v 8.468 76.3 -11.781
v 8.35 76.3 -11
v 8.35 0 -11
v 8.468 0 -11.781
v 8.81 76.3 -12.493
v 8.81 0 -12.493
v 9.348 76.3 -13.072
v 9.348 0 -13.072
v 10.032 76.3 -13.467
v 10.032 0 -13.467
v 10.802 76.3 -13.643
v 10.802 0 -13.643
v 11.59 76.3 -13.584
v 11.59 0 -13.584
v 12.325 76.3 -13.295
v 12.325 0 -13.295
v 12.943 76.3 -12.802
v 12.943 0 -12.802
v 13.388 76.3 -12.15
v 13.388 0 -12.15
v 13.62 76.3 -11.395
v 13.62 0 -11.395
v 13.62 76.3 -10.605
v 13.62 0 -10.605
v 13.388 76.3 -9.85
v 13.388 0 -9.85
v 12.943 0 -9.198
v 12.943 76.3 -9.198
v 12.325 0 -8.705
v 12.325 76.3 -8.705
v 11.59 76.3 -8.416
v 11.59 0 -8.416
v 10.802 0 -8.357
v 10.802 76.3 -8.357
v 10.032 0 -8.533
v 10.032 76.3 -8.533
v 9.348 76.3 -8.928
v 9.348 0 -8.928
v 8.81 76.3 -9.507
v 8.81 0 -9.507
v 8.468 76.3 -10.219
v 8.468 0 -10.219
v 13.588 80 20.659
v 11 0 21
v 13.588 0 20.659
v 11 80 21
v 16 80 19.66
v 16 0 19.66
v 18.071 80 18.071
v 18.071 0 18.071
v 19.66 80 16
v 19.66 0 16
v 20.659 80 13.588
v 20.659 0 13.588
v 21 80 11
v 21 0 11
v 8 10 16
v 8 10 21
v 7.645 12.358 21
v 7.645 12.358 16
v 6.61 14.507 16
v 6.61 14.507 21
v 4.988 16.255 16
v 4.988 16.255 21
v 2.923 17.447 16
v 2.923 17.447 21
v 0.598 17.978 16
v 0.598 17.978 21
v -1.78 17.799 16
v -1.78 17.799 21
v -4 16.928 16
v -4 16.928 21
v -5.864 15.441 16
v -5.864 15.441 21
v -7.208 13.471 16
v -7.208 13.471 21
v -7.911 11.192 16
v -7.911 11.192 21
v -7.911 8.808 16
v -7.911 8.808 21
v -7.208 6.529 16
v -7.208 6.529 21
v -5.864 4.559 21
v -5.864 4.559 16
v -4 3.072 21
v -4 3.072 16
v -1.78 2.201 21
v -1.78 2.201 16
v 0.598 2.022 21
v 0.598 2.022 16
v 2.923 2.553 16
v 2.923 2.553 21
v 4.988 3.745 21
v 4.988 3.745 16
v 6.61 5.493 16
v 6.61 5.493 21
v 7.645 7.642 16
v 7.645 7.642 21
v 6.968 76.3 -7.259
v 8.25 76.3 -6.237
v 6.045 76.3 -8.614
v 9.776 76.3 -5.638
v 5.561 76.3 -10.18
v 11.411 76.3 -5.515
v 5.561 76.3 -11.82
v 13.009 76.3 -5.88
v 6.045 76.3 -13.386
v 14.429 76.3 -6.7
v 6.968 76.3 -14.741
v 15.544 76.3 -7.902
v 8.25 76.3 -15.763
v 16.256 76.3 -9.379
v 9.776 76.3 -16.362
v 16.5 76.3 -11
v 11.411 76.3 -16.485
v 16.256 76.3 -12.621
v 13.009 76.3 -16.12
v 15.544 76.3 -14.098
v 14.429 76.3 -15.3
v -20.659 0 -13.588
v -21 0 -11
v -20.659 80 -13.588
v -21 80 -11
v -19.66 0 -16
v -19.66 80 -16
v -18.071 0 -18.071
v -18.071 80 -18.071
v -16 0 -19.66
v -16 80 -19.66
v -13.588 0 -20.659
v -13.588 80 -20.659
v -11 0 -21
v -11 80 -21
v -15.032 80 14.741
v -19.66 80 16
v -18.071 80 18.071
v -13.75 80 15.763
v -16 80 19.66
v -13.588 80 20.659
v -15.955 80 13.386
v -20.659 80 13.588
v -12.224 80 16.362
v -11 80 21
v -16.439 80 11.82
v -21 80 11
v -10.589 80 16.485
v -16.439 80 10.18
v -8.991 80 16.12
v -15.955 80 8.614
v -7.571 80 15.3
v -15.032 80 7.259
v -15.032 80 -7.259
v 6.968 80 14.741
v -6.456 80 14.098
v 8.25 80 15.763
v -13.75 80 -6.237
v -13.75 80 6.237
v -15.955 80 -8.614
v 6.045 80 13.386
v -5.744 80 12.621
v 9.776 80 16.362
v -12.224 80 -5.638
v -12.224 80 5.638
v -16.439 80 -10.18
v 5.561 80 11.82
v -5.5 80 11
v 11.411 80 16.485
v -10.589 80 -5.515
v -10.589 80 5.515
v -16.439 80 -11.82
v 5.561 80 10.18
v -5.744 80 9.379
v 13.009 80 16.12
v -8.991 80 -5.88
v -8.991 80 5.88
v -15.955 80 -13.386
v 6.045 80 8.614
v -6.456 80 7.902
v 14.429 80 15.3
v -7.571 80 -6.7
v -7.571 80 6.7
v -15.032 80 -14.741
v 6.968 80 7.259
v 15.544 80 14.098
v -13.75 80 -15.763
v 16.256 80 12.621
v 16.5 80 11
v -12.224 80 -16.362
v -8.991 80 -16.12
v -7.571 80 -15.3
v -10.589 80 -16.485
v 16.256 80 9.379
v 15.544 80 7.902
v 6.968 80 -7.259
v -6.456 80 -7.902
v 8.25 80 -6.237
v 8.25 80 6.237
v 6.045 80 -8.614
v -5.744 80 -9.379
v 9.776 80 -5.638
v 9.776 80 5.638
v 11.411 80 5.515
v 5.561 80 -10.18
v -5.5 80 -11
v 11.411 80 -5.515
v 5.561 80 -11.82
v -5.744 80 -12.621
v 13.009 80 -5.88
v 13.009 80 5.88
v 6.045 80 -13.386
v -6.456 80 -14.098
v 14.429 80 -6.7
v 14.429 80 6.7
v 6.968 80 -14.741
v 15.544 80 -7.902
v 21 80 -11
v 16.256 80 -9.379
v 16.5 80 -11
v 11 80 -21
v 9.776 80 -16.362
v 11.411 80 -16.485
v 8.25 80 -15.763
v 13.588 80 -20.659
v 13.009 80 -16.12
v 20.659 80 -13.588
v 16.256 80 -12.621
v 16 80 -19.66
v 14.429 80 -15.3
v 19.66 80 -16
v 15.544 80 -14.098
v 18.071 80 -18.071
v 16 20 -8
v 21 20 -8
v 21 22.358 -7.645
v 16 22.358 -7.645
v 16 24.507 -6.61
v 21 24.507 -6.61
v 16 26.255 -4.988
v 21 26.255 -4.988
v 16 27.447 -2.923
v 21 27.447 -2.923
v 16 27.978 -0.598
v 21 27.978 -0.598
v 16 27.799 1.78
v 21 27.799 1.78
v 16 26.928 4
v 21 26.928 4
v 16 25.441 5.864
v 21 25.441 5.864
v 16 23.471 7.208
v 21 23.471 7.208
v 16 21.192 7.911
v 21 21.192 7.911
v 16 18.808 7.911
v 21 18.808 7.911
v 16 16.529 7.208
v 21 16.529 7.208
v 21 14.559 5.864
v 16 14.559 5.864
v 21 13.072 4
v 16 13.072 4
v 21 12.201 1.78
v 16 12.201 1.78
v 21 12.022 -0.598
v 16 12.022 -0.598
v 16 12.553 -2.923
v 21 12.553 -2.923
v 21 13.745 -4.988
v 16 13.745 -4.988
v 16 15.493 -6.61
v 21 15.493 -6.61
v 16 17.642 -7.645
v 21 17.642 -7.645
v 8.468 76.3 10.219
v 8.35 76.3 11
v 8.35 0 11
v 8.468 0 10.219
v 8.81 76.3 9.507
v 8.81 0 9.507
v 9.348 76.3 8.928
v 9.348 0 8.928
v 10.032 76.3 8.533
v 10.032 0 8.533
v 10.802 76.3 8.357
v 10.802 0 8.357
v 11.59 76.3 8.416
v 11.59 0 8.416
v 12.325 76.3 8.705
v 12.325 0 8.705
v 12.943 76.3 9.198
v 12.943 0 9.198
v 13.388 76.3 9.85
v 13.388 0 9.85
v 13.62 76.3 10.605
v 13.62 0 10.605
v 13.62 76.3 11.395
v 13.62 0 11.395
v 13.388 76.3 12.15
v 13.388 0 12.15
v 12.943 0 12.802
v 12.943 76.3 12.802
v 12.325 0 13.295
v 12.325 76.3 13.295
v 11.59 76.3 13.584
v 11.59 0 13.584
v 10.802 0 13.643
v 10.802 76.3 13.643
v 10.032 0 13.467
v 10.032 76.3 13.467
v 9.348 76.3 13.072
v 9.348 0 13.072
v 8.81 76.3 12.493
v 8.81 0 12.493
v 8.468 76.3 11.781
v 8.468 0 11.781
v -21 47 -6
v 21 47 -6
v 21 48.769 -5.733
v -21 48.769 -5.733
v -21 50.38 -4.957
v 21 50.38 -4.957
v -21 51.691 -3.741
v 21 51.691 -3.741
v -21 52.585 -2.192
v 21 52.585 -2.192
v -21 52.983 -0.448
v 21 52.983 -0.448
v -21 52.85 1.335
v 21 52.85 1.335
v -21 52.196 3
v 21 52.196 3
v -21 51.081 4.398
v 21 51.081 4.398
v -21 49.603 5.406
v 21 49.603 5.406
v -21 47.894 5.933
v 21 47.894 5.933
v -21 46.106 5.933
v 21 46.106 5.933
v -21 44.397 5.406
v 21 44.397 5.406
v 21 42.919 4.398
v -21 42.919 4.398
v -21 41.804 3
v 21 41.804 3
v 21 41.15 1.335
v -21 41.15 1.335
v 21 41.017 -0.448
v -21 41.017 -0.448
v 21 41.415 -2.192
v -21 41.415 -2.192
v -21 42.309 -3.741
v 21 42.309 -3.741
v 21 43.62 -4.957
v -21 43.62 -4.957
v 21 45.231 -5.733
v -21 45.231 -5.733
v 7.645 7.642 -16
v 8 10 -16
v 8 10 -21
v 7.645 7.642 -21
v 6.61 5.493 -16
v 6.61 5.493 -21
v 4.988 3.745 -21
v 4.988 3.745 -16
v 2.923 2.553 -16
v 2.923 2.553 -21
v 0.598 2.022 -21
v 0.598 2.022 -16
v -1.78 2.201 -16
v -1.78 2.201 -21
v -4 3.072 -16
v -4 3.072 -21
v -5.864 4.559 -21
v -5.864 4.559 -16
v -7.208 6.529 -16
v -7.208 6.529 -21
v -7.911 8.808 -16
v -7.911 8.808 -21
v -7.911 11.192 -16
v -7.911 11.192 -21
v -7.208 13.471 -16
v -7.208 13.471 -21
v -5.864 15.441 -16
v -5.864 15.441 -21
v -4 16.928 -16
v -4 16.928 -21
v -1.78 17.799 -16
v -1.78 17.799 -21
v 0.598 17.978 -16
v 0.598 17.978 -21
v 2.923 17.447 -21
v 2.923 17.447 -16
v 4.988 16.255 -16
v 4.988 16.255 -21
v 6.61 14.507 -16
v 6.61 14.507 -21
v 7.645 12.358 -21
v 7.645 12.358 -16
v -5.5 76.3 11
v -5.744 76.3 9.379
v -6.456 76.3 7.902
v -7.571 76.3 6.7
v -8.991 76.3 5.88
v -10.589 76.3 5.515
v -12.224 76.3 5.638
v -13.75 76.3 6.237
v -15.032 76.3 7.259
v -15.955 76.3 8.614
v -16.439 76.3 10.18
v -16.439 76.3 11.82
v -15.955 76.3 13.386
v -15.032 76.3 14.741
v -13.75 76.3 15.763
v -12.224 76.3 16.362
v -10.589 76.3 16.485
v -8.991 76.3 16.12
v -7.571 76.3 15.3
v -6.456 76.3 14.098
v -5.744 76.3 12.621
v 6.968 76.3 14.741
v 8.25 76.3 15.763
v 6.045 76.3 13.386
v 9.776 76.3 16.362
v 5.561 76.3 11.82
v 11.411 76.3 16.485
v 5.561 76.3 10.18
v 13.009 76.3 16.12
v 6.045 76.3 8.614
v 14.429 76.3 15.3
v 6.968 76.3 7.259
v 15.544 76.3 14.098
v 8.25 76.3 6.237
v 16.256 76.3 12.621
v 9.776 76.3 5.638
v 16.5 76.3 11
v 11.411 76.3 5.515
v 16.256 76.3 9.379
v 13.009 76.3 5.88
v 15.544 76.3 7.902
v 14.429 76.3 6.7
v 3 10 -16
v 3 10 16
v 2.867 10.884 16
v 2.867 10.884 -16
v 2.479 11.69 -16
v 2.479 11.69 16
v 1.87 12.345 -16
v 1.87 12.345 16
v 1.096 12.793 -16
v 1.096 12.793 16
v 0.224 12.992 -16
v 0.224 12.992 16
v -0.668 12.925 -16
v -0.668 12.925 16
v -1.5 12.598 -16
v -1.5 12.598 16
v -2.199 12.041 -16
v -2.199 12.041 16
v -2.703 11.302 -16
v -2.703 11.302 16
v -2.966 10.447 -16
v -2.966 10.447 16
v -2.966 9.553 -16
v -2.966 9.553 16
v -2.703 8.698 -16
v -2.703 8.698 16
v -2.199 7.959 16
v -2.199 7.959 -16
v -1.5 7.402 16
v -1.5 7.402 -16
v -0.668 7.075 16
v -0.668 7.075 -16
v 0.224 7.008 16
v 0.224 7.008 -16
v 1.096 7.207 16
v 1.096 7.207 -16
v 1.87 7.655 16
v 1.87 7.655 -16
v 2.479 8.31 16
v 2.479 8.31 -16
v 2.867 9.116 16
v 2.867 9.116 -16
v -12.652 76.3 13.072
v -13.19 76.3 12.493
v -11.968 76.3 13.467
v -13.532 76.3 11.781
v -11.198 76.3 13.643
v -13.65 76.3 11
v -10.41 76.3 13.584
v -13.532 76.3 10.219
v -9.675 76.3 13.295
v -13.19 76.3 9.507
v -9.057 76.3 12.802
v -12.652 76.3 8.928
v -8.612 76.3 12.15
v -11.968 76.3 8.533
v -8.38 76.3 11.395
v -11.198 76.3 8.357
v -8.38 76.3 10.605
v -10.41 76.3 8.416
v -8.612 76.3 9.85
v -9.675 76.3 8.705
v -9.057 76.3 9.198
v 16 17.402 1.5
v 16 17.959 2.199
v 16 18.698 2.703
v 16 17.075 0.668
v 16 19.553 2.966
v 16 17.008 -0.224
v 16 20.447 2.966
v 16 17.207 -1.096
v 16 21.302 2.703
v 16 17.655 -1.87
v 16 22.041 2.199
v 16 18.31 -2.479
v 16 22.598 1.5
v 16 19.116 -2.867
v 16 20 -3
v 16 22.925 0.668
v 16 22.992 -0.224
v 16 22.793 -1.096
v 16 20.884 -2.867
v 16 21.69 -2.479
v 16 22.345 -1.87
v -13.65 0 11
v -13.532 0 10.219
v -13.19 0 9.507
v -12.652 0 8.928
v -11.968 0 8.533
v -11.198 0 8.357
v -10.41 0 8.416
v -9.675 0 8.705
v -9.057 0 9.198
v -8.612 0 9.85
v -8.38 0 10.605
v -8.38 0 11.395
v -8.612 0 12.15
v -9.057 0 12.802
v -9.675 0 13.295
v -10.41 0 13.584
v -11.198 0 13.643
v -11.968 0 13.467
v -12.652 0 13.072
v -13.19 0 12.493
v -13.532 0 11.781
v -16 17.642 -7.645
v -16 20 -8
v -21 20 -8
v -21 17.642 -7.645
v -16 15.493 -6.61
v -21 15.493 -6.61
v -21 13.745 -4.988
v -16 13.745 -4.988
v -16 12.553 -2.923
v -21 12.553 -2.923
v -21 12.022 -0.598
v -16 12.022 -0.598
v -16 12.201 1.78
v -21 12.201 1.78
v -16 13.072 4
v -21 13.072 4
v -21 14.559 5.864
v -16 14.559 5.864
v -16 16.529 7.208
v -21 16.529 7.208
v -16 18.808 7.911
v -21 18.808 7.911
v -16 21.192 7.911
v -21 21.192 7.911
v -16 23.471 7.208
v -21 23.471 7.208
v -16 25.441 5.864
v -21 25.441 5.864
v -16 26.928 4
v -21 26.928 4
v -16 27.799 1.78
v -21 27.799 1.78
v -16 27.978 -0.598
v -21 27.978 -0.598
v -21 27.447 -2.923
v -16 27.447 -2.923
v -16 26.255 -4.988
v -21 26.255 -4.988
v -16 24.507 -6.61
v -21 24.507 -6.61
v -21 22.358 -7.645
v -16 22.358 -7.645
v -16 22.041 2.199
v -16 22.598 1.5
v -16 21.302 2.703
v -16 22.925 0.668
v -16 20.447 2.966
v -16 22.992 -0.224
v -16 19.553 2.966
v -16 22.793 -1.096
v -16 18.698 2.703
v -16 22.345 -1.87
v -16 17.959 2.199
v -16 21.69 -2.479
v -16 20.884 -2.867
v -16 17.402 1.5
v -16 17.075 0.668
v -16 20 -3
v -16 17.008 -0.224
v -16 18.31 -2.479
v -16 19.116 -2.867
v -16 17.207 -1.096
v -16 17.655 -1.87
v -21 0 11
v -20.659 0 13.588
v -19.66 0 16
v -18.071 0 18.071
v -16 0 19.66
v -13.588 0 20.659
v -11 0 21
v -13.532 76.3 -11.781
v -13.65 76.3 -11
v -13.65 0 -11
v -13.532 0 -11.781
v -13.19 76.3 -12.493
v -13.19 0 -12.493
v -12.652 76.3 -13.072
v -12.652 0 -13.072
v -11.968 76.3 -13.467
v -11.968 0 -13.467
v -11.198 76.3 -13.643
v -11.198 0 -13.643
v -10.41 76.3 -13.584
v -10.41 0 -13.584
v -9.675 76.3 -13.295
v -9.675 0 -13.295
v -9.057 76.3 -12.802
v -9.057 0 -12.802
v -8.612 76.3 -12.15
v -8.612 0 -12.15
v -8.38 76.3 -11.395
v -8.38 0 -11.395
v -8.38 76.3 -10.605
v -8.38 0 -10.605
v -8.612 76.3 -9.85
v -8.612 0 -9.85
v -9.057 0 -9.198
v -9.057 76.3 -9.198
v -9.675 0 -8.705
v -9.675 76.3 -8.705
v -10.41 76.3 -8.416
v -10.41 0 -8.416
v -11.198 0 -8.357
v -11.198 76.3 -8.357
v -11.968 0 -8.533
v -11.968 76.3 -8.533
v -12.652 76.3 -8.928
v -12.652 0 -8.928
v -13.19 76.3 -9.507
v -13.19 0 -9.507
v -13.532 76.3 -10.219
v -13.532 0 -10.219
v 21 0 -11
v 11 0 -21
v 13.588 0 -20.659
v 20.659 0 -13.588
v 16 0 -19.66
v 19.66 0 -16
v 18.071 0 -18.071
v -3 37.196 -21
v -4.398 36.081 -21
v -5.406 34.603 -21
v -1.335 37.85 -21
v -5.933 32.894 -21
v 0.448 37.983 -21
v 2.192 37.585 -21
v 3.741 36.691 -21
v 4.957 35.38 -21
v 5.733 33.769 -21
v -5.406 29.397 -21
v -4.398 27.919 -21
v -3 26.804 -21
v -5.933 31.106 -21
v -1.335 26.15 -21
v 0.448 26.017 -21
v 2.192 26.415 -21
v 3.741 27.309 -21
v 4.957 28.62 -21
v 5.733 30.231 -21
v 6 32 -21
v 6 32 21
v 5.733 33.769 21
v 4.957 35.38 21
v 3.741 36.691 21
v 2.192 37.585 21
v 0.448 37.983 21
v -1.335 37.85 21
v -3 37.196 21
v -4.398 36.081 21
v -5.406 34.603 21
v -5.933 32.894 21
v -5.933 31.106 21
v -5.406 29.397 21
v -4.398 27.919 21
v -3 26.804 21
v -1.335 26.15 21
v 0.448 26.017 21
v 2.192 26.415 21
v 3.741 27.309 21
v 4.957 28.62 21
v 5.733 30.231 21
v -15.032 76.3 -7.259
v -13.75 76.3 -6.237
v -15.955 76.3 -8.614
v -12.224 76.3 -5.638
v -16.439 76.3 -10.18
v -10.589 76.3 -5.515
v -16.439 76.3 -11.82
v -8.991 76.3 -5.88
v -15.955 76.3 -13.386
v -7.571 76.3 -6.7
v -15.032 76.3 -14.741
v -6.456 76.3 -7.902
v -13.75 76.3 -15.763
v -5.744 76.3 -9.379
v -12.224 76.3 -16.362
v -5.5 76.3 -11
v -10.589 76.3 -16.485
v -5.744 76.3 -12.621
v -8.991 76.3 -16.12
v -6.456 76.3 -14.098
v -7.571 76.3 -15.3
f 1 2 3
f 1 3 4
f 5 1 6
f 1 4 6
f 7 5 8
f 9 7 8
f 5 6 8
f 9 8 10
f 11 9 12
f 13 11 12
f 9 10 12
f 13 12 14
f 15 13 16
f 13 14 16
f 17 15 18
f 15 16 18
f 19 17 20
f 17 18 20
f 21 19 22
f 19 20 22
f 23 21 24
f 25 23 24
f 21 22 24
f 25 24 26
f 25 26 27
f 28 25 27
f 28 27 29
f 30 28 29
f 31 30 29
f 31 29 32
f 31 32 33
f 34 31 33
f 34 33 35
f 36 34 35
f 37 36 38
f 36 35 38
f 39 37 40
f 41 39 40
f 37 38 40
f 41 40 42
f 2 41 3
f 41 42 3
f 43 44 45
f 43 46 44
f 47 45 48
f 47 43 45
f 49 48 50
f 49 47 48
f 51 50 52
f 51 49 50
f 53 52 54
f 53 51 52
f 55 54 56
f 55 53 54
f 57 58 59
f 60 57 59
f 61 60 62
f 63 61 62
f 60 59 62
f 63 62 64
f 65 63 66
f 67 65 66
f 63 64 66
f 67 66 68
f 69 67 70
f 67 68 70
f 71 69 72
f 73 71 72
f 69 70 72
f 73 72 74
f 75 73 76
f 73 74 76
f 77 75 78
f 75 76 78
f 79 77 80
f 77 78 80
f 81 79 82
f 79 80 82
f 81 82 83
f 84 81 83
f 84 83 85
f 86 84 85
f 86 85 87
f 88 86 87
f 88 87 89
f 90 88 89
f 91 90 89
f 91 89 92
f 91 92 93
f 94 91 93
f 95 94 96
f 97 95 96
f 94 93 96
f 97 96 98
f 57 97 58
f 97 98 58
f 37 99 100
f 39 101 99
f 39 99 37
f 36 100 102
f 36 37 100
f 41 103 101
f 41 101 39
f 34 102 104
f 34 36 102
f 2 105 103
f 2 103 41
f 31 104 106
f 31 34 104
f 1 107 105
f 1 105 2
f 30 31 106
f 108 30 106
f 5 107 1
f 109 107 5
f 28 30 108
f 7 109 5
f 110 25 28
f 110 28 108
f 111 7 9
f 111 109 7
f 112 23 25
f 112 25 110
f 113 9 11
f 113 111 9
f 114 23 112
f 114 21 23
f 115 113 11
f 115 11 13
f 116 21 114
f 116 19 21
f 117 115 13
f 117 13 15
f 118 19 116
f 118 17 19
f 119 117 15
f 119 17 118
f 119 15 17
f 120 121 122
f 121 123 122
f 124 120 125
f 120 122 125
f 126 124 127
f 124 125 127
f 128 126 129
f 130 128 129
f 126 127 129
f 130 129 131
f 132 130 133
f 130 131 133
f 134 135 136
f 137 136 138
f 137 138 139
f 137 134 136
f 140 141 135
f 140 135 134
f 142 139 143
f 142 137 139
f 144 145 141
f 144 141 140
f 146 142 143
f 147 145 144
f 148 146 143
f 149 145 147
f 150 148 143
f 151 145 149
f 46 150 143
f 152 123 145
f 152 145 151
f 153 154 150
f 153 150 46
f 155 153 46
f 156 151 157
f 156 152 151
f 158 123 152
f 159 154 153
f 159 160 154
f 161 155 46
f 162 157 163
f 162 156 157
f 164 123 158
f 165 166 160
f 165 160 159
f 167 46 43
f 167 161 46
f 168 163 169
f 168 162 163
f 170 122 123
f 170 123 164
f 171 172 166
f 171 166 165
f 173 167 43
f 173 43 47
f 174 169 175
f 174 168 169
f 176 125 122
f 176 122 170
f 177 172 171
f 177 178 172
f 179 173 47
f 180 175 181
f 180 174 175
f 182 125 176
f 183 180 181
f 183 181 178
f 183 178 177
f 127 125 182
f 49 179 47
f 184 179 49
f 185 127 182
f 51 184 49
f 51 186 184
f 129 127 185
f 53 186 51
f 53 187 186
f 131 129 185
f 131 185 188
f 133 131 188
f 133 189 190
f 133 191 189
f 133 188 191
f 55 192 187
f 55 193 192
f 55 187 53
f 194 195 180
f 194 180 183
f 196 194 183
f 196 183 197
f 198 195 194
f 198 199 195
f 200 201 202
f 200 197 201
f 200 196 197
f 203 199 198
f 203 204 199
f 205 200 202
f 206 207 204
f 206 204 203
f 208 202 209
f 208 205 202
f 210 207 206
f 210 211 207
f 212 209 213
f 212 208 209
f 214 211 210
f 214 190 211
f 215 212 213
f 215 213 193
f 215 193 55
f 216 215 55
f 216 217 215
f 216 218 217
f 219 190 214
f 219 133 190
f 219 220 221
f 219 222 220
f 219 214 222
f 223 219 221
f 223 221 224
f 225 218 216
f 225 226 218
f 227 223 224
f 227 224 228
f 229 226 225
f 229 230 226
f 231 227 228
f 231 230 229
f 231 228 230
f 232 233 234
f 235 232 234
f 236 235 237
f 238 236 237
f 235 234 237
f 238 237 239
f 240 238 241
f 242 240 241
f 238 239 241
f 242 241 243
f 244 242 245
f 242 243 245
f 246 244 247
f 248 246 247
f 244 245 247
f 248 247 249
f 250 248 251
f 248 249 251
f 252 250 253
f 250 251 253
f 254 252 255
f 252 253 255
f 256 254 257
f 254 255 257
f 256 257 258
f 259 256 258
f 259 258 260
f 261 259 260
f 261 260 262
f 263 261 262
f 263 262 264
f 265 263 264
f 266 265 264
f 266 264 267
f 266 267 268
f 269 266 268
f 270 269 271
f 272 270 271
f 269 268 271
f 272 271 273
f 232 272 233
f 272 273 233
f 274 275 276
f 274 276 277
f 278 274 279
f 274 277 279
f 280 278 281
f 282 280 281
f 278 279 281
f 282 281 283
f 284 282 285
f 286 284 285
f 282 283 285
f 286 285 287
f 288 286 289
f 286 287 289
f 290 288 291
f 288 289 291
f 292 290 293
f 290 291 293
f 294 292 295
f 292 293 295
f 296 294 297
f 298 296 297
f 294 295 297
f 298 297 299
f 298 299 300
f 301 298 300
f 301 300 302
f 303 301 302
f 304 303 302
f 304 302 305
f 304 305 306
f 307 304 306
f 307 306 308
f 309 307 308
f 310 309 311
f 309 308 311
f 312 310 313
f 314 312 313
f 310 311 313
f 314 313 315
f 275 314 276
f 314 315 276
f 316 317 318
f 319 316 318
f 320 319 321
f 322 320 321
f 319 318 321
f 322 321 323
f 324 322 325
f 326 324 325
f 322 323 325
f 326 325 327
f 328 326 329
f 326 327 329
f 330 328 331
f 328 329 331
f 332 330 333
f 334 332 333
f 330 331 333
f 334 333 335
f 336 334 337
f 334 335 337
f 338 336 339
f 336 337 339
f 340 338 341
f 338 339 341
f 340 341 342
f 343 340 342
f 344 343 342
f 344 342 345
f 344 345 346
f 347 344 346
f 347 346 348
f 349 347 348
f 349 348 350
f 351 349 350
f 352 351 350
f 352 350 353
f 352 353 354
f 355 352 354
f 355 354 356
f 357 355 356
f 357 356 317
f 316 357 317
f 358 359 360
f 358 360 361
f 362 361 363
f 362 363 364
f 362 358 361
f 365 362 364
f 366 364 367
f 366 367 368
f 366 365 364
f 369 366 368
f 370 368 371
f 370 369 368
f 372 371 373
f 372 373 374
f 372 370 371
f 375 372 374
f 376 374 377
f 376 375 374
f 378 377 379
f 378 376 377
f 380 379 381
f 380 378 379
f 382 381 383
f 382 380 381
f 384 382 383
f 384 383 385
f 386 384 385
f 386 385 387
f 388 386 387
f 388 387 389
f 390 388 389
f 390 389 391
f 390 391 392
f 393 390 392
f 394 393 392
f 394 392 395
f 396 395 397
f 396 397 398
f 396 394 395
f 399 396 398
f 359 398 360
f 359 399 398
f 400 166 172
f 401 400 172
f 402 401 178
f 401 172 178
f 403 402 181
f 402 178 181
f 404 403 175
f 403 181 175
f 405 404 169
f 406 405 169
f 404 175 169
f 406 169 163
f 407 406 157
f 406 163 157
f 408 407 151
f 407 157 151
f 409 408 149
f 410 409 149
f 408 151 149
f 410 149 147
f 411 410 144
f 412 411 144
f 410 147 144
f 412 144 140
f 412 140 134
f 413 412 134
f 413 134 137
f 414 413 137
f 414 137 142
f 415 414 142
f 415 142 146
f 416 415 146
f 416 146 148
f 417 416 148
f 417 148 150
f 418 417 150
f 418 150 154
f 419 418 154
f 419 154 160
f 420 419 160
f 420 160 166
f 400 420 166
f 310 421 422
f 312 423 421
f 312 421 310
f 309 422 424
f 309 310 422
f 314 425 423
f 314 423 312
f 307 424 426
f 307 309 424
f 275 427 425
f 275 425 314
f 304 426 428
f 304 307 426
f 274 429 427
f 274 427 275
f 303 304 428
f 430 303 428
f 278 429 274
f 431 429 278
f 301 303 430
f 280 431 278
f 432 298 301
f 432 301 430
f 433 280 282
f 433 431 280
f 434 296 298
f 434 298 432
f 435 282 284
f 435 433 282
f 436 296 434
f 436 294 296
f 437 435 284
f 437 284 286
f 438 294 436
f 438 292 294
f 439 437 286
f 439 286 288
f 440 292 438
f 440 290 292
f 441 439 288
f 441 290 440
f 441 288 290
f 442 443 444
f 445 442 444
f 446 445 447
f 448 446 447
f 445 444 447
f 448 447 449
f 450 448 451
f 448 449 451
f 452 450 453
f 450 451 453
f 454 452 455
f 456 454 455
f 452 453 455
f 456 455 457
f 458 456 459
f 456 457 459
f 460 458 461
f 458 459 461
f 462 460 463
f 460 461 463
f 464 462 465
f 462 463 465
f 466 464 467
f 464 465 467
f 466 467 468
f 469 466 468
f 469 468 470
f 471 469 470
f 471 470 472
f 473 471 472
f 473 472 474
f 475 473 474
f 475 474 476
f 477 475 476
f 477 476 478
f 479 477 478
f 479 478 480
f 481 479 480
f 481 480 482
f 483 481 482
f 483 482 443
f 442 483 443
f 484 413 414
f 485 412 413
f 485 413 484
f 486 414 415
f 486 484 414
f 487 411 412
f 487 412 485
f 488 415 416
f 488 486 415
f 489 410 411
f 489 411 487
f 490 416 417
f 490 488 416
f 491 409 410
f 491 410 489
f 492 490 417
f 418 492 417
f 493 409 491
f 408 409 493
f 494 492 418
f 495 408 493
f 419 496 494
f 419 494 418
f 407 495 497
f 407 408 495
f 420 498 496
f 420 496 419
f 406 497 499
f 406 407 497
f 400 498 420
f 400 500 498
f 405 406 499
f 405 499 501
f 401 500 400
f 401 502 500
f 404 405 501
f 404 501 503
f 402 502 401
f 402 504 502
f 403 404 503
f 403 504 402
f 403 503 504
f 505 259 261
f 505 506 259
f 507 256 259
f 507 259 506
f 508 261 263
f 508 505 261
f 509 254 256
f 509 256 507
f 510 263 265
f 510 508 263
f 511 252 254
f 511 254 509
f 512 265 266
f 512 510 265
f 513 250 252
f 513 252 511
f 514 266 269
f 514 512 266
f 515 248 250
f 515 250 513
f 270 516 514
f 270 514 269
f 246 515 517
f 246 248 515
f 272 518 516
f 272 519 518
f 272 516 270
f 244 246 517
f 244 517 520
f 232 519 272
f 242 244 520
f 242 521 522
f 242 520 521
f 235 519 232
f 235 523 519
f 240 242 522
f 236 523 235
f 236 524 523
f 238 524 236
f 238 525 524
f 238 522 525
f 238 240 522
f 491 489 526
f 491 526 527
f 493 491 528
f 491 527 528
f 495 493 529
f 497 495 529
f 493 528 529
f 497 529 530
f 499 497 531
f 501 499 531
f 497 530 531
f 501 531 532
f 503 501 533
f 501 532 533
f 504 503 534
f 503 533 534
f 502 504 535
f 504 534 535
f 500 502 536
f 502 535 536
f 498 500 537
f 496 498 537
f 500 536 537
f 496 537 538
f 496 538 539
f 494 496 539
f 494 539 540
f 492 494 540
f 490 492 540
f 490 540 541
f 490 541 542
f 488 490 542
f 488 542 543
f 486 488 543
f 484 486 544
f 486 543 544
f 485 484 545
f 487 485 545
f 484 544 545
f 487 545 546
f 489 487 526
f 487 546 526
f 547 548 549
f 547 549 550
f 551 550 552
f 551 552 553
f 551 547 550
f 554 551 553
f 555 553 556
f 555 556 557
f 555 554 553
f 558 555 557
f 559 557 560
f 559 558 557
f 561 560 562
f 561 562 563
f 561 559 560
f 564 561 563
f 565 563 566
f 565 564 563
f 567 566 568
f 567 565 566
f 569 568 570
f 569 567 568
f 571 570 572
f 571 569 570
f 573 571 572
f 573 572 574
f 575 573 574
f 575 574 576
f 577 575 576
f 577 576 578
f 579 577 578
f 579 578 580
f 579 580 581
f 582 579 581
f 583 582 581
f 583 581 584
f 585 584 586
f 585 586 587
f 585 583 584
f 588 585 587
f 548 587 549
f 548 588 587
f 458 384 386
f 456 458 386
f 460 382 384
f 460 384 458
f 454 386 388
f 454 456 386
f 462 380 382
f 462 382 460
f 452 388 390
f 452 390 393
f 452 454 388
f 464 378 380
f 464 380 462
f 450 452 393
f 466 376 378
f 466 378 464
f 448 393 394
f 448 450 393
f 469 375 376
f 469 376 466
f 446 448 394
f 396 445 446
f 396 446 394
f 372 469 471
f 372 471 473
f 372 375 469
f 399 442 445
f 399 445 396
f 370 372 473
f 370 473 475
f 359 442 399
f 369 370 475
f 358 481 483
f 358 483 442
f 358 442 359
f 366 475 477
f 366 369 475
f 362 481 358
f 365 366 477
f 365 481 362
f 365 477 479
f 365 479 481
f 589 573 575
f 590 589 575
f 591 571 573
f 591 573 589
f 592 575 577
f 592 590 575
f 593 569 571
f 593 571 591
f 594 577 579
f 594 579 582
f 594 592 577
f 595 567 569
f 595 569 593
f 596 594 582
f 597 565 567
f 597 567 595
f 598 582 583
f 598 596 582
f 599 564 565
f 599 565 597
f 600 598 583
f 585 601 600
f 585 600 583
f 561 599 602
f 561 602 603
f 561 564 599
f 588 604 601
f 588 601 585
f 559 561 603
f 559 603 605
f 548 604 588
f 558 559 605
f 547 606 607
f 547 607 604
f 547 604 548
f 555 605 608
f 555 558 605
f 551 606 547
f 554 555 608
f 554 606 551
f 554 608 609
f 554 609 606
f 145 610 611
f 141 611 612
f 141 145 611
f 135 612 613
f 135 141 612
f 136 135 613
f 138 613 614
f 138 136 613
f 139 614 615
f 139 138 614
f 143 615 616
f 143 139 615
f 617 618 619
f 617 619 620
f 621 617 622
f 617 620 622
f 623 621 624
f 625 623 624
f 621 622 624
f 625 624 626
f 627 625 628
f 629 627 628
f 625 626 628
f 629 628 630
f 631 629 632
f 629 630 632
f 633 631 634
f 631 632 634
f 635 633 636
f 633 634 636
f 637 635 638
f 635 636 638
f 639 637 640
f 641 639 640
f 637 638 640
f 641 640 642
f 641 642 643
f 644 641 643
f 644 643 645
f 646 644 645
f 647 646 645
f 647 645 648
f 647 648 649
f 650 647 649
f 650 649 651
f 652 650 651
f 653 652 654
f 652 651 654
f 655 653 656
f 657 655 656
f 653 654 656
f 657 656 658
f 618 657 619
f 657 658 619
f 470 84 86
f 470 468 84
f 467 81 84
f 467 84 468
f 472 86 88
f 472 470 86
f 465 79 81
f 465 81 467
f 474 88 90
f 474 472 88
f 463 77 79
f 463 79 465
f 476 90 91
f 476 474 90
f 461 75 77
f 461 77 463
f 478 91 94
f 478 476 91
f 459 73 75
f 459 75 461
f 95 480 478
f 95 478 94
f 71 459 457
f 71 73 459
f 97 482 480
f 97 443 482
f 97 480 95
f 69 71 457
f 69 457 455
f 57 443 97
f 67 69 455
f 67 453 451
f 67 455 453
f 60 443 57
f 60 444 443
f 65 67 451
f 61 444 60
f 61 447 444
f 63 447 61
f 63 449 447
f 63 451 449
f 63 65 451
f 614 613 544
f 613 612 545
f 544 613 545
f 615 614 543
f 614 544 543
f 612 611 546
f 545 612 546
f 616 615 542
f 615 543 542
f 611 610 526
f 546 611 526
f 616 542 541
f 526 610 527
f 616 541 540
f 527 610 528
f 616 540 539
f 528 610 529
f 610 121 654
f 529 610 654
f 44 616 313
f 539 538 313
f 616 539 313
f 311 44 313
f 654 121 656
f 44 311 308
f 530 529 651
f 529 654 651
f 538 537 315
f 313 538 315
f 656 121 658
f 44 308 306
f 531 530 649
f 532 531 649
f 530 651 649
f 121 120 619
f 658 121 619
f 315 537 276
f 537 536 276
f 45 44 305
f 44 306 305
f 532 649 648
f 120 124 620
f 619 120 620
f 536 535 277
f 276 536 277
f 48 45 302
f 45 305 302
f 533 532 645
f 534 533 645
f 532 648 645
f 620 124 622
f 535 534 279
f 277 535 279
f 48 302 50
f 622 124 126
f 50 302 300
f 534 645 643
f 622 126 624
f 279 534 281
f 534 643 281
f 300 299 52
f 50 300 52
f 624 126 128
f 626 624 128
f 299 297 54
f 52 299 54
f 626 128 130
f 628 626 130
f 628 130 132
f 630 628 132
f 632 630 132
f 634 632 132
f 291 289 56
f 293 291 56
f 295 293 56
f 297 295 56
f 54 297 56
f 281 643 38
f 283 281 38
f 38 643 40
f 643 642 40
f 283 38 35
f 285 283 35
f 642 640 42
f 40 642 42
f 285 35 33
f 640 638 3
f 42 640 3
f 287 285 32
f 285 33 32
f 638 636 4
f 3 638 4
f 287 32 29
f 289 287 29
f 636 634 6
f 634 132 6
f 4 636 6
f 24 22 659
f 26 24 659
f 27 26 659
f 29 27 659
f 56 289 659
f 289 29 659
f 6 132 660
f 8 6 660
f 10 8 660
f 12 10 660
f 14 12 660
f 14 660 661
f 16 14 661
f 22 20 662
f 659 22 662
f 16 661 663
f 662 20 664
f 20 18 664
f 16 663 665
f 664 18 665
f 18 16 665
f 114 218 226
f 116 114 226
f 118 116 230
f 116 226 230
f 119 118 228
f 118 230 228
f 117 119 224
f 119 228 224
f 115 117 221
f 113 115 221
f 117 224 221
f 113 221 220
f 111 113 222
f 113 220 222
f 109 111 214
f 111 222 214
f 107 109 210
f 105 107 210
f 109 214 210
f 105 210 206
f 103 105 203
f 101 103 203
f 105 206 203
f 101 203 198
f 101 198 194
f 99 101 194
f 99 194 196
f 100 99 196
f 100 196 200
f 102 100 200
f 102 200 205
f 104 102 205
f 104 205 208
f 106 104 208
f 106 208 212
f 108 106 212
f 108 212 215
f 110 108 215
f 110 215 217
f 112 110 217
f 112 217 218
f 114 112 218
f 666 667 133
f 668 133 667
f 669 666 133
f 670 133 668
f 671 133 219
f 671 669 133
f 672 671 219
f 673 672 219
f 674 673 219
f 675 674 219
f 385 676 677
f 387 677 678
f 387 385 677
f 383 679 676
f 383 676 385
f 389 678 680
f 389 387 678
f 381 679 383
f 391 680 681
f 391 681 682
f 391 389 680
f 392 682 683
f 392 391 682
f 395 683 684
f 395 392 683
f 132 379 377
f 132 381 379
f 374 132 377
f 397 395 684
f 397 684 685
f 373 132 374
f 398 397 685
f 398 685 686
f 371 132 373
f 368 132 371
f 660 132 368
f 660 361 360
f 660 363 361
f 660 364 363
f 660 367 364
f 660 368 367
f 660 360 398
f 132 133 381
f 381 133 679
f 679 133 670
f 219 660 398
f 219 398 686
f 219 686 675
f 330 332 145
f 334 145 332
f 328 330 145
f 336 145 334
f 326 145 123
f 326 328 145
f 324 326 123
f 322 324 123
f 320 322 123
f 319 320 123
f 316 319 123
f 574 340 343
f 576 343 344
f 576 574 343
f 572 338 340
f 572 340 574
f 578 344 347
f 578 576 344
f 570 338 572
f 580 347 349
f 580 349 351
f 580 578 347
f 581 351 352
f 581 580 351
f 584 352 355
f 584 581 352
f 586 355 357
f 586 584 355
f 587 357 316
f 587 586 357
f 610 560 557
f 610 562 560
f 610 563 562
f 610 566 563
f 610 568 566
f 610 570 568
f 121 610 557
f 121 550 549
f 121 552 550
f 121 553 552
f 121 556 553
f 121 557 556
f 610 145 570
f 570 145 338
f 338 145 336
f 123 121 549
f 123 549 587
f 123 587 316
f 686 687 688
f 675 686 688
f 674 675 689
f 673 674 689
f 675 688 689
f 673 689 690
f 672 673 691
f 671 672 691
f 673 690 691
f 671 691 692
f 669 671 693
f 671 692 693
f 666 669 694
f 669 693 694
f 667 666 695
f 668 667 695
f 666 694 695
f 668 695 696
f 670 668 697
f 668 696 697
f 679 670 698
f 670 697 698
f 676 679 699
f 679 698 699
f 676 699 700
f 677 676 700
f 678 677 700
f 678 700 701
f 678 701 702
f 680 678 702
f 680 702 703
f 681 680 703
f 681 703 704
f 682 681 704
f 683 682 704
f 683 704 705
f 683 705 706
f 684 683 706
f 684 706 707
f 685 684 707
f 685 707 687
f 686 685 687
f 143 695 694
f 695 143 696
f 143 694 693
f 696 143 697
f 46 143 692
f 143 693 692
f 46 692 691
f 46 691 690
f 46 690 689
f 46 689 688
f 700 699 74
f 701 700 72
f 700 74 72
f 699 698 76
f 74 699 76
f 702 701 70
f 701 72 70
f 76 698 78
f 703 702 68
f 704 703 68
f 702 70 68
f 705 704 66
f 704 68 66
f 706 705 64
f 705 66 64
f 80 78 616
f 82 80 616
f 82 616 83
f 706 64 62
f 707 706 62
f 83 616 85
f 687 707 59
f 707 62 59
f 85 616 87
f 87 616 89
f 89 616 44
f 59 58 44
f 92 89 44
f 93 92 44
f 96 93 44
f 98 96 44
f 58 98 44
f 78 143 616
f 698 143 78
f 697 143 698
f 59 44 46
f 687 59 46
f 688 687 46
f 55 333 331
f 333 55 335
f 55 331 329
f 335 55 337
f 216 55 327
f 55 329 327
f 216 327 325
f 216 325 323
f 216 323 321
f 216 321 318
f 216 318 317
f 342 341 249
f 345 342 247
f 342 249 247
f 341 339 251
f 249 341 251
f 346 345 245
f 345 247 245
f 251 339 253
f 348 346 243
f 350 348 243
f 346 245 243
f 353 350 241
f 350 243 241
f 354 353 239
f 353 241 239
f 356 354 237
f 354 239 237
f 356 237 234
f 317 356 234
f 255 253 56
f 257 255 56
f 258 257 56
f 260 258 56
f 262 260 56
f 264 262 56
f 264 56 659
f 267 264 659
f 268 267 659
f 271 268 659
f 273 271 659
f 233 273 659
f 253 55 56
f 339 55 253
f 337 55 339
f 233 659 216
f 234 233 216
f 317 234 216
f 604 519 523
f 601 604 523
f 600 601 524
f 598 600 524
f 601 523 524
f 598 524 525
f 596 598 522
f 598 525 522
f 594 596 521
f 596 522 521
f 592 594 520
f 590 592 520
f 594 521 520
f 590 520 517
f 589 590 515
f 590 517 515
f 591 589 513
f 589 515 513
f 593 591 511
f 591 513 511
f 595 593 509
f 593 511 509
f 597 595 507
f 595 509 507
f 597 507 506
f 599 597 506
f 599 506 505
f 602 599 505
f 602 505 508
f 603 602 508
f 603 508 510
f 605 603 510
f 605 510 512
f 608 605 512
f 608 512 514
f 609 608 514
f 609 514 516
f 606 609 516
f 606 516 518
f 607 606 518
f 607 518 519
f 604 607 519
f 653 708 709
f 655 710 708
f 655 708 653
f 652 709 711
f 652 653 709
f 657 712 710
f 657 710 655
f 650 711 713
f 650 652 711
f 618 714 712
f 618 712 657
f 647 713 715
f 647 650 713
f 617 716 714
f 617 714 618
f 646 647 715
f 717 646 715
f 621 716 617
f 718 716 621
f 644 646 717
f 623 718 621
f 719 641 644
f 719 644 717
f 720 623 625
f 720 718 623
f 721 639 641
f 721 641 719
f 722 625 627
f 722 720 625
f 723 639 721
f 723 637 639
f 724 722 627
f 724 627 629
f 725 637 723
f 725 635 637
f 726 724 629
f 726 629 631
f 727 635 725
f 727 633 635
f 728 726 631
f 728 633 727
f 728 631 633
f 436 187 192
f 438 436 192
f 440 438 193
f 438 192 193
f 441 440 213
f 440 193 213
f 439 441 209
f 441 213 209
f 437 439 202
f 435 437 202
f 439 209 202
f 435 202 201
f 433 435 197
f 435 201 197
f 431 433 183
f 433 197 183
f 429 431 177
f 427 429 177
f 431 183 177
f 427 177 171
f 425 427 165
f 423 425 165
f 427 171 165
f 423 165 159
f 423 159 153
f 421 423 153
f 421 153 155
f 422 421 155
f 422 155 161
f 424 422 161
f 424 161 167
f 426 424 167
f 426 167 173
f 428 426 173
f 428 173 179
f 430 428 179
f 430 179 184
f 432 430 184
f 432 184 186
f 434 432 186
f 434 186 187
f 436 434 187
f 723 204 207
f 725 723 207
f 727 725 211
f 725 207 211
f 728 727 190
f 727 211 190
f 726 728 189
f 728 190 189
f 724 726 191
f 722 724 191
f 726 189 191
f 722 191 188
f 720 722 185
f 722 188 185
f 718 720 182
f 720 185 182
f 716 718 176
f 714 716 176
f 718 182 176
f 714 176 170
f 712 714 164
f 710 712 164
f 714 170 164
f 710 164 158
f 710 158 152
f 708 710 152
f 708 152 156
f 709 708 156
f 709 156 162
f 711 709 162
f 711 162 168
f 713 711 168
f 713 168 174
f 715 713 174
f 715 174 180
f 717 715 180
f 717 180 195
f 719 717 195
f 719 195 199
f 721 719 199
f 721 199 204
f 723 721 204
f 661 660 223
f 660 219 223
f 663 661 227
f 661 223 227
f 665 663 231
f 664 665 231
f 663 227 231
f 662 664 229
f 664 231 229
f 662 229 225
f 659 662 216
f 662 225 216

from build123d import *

# Parameters (mm, degrees)
SKETCH1_W                                        = 42
SKETCH1_H                                        = 42
BOSS_EXTRUDE1_DEPTH                              = 80
SKETCH2_R                                        = 6
CUT_EXTRUDE1_DEPTH                               = 93.763139231
SKETCH3_R                                        = 6
CUT_EXTRUDE2_DEPTH                               = 93.763139231
SKETCH4_R                                        = 3
CUT_EXTRUDE3_DEPTH                               = 93.763139231
SKETCH5_R                                        = 8
CUT_EXTRUDE4_DEPTH                               = 5
CUT_EXTRUDE5_START                               = -5
SKETCH6_R                                        = 8
CUT_EXTRUDE5_DEPTH                               = 5
SKETCH7_R                                        = 3
CUT_EXTRUDE6_DEPTH                               = 93.763139231
SKETCH8_R                                        = 8
CUT_EXTRUDE7_DEPTH                               = 5
CUT_EXTRUDE8_START                               = -5
SKETCH9_R                                        = 8
CUT_EXTRUDE8_DEPTH                               = 5
FILLET1_R                                        = 10
CBORE_FOR_M5_PAN_HEAD_MACHINE_SCREW1_D           = 5.3
CBORE_FOR_M5_PAN_HEAD_MACHINE_SCREW1_CBORE_D     = 11
CBORE_FOR_M5_PAN_HEAD_MACHINE_SCREW1_CBORE_DEPTH = 3.7


with BuildPart() as part:
    # Sketch1 → Boss-Extrude1 (new body)
    with BuildSketch(Plane(origin=(0, 0, 0), x_dir=(1, 0, 0), z_dir=(0, 1, 0))):
        Rectangle(SKETCH1_W, SKETCH1_H)
    extrude(amount=BOSS_EXTRUDE1_DEPTH)

    # Sketch2 → Cut-Extrude1 (cut, through all)
    with BuildSketch(Plane.XY.offset(21)):
        with Locations((0, 32)):
            Circle(SKETCH2_R)
    extrude(amount=-CUT_EXTRUDE1_DEPTH, mode=Mode.SUBTRACT)

    # Sketch3 → Cut-Extrude2 (cut, through all)
    with BuildSketch(Plane(origin=(21, 0, 0), x_dir=(0, 0, -1), z_dir=(1, 0, 0))):
        with Locations((0, 47)):
            Circle(SKETCH3_R)
    extrude(amount=-CUT_EXTRUDE2_DEPTH, mode=Mode.SUBTRACT)

    # Sketch4 → Cut-Extrude3 (cut, through all)
    with BuildSketch(Plane.XY.offset(21)):
        with Locations((0, 10)):
            Circle(SKETCH4_R)
    extrude(amount=-CUT_EXTRUDE3_DEPTH, mode=Mode.SUBTRACT)

    # Sketch5 → Cut-Extrude4 (cut)
    with BuildSketch(Plane.XY.offset(21)):
        with Locations((0, 10)):
            Circle(SKETCH5_R)
    extrude(amount=-CUT_EXTRUDE4_DEPTH, mode=Mode.SUBTRACT)

    # Sketch6 → Cut-Extrude5 (cut)
    with BuildSketch(Plane(origin=(0, 0, -21), x_dir=(-1, 0, 0), z_dir=(0, 0, -1)).offset(CUT_EXTRUDE5_START)):
        with Locations(Location((0, 10, 0), (0, 0, 180))):
            Circle(SKETCH6_R)
    extrude(amount=CUT_EXTRUDE5_DEPTH, mode=Mode.SUBTRACT)

    # Sketch7 → Cut-Extrude6 (cut, through all)
    with BuildSketch(Plane(origin=(21, 0, 0), x_dir=(0, 0, -1), z_dir=(1, 0, 0))):
        with Locations((0, 20)):
            Circle(SKETCH7_R)
    extrude(amount=-CUT_EXTRUDE6_DEPTH, mode=Mode.SUBTRACT)

    # Sketch8 → Cut-Extrude7 (cut)
    with BuildSketch(Plane(origin=(21, 0, 0), x_dir=(0, 0, -1), z_dir=(1, 0, 0))):
        with Locations((0, 20)):
            Circle(SKETCH8_R)
    extrude(amount=-CUT_EXTRUDE7_DEPTH, mode=Mode.SUBTRACT)

    # Sketch9 → Cut-Extrude8 (cut)
    with BuildSketch(Plane.ZY.offset(21).offset(CUT_EXTRUDE8_START)):
        with Locations(Location((0, 20, 0), (0, 0, 180))):
            Circle(SKETCH9_R)
    extrude(amount=CUT_EXTRUDE8_DEPTH, mode=Mode.SUBTRACT)

    # Fillet1
    fillet1_edges = [part.edges().sort_by_distance(p)[0] for p in [
        (21, 40, 21),
        (-21, 40, 21),
        (-21, 40, -21),
        (21, 40, -21),
    ]]
    fillet(fillet1_edges, radius=FILLET1_R)

    # CBORE for M5 Pan Head Machine Screw1 (through all)
    with Locations(Plane(origin=(0, 80, 0), x_dir=(1, 0, 0), z_dir=(0, 1, 0))):
        with Locations((-11, 11), (11, 11), (11, -11), (-11, -11)):
            CounterBoreHole(CBORE_FOR_M5_PAN_HEAD_MACHINE_SCREW1_D / 2, CBORE_FOR_M5_PAN_HEAD_MACHINE_SCREW1_CBORE_D / 2, CBORE_FOR_M5_PAN_HEAD_MACHINE_SCREW1_CBORE_DEPTH)


solid = part.part
